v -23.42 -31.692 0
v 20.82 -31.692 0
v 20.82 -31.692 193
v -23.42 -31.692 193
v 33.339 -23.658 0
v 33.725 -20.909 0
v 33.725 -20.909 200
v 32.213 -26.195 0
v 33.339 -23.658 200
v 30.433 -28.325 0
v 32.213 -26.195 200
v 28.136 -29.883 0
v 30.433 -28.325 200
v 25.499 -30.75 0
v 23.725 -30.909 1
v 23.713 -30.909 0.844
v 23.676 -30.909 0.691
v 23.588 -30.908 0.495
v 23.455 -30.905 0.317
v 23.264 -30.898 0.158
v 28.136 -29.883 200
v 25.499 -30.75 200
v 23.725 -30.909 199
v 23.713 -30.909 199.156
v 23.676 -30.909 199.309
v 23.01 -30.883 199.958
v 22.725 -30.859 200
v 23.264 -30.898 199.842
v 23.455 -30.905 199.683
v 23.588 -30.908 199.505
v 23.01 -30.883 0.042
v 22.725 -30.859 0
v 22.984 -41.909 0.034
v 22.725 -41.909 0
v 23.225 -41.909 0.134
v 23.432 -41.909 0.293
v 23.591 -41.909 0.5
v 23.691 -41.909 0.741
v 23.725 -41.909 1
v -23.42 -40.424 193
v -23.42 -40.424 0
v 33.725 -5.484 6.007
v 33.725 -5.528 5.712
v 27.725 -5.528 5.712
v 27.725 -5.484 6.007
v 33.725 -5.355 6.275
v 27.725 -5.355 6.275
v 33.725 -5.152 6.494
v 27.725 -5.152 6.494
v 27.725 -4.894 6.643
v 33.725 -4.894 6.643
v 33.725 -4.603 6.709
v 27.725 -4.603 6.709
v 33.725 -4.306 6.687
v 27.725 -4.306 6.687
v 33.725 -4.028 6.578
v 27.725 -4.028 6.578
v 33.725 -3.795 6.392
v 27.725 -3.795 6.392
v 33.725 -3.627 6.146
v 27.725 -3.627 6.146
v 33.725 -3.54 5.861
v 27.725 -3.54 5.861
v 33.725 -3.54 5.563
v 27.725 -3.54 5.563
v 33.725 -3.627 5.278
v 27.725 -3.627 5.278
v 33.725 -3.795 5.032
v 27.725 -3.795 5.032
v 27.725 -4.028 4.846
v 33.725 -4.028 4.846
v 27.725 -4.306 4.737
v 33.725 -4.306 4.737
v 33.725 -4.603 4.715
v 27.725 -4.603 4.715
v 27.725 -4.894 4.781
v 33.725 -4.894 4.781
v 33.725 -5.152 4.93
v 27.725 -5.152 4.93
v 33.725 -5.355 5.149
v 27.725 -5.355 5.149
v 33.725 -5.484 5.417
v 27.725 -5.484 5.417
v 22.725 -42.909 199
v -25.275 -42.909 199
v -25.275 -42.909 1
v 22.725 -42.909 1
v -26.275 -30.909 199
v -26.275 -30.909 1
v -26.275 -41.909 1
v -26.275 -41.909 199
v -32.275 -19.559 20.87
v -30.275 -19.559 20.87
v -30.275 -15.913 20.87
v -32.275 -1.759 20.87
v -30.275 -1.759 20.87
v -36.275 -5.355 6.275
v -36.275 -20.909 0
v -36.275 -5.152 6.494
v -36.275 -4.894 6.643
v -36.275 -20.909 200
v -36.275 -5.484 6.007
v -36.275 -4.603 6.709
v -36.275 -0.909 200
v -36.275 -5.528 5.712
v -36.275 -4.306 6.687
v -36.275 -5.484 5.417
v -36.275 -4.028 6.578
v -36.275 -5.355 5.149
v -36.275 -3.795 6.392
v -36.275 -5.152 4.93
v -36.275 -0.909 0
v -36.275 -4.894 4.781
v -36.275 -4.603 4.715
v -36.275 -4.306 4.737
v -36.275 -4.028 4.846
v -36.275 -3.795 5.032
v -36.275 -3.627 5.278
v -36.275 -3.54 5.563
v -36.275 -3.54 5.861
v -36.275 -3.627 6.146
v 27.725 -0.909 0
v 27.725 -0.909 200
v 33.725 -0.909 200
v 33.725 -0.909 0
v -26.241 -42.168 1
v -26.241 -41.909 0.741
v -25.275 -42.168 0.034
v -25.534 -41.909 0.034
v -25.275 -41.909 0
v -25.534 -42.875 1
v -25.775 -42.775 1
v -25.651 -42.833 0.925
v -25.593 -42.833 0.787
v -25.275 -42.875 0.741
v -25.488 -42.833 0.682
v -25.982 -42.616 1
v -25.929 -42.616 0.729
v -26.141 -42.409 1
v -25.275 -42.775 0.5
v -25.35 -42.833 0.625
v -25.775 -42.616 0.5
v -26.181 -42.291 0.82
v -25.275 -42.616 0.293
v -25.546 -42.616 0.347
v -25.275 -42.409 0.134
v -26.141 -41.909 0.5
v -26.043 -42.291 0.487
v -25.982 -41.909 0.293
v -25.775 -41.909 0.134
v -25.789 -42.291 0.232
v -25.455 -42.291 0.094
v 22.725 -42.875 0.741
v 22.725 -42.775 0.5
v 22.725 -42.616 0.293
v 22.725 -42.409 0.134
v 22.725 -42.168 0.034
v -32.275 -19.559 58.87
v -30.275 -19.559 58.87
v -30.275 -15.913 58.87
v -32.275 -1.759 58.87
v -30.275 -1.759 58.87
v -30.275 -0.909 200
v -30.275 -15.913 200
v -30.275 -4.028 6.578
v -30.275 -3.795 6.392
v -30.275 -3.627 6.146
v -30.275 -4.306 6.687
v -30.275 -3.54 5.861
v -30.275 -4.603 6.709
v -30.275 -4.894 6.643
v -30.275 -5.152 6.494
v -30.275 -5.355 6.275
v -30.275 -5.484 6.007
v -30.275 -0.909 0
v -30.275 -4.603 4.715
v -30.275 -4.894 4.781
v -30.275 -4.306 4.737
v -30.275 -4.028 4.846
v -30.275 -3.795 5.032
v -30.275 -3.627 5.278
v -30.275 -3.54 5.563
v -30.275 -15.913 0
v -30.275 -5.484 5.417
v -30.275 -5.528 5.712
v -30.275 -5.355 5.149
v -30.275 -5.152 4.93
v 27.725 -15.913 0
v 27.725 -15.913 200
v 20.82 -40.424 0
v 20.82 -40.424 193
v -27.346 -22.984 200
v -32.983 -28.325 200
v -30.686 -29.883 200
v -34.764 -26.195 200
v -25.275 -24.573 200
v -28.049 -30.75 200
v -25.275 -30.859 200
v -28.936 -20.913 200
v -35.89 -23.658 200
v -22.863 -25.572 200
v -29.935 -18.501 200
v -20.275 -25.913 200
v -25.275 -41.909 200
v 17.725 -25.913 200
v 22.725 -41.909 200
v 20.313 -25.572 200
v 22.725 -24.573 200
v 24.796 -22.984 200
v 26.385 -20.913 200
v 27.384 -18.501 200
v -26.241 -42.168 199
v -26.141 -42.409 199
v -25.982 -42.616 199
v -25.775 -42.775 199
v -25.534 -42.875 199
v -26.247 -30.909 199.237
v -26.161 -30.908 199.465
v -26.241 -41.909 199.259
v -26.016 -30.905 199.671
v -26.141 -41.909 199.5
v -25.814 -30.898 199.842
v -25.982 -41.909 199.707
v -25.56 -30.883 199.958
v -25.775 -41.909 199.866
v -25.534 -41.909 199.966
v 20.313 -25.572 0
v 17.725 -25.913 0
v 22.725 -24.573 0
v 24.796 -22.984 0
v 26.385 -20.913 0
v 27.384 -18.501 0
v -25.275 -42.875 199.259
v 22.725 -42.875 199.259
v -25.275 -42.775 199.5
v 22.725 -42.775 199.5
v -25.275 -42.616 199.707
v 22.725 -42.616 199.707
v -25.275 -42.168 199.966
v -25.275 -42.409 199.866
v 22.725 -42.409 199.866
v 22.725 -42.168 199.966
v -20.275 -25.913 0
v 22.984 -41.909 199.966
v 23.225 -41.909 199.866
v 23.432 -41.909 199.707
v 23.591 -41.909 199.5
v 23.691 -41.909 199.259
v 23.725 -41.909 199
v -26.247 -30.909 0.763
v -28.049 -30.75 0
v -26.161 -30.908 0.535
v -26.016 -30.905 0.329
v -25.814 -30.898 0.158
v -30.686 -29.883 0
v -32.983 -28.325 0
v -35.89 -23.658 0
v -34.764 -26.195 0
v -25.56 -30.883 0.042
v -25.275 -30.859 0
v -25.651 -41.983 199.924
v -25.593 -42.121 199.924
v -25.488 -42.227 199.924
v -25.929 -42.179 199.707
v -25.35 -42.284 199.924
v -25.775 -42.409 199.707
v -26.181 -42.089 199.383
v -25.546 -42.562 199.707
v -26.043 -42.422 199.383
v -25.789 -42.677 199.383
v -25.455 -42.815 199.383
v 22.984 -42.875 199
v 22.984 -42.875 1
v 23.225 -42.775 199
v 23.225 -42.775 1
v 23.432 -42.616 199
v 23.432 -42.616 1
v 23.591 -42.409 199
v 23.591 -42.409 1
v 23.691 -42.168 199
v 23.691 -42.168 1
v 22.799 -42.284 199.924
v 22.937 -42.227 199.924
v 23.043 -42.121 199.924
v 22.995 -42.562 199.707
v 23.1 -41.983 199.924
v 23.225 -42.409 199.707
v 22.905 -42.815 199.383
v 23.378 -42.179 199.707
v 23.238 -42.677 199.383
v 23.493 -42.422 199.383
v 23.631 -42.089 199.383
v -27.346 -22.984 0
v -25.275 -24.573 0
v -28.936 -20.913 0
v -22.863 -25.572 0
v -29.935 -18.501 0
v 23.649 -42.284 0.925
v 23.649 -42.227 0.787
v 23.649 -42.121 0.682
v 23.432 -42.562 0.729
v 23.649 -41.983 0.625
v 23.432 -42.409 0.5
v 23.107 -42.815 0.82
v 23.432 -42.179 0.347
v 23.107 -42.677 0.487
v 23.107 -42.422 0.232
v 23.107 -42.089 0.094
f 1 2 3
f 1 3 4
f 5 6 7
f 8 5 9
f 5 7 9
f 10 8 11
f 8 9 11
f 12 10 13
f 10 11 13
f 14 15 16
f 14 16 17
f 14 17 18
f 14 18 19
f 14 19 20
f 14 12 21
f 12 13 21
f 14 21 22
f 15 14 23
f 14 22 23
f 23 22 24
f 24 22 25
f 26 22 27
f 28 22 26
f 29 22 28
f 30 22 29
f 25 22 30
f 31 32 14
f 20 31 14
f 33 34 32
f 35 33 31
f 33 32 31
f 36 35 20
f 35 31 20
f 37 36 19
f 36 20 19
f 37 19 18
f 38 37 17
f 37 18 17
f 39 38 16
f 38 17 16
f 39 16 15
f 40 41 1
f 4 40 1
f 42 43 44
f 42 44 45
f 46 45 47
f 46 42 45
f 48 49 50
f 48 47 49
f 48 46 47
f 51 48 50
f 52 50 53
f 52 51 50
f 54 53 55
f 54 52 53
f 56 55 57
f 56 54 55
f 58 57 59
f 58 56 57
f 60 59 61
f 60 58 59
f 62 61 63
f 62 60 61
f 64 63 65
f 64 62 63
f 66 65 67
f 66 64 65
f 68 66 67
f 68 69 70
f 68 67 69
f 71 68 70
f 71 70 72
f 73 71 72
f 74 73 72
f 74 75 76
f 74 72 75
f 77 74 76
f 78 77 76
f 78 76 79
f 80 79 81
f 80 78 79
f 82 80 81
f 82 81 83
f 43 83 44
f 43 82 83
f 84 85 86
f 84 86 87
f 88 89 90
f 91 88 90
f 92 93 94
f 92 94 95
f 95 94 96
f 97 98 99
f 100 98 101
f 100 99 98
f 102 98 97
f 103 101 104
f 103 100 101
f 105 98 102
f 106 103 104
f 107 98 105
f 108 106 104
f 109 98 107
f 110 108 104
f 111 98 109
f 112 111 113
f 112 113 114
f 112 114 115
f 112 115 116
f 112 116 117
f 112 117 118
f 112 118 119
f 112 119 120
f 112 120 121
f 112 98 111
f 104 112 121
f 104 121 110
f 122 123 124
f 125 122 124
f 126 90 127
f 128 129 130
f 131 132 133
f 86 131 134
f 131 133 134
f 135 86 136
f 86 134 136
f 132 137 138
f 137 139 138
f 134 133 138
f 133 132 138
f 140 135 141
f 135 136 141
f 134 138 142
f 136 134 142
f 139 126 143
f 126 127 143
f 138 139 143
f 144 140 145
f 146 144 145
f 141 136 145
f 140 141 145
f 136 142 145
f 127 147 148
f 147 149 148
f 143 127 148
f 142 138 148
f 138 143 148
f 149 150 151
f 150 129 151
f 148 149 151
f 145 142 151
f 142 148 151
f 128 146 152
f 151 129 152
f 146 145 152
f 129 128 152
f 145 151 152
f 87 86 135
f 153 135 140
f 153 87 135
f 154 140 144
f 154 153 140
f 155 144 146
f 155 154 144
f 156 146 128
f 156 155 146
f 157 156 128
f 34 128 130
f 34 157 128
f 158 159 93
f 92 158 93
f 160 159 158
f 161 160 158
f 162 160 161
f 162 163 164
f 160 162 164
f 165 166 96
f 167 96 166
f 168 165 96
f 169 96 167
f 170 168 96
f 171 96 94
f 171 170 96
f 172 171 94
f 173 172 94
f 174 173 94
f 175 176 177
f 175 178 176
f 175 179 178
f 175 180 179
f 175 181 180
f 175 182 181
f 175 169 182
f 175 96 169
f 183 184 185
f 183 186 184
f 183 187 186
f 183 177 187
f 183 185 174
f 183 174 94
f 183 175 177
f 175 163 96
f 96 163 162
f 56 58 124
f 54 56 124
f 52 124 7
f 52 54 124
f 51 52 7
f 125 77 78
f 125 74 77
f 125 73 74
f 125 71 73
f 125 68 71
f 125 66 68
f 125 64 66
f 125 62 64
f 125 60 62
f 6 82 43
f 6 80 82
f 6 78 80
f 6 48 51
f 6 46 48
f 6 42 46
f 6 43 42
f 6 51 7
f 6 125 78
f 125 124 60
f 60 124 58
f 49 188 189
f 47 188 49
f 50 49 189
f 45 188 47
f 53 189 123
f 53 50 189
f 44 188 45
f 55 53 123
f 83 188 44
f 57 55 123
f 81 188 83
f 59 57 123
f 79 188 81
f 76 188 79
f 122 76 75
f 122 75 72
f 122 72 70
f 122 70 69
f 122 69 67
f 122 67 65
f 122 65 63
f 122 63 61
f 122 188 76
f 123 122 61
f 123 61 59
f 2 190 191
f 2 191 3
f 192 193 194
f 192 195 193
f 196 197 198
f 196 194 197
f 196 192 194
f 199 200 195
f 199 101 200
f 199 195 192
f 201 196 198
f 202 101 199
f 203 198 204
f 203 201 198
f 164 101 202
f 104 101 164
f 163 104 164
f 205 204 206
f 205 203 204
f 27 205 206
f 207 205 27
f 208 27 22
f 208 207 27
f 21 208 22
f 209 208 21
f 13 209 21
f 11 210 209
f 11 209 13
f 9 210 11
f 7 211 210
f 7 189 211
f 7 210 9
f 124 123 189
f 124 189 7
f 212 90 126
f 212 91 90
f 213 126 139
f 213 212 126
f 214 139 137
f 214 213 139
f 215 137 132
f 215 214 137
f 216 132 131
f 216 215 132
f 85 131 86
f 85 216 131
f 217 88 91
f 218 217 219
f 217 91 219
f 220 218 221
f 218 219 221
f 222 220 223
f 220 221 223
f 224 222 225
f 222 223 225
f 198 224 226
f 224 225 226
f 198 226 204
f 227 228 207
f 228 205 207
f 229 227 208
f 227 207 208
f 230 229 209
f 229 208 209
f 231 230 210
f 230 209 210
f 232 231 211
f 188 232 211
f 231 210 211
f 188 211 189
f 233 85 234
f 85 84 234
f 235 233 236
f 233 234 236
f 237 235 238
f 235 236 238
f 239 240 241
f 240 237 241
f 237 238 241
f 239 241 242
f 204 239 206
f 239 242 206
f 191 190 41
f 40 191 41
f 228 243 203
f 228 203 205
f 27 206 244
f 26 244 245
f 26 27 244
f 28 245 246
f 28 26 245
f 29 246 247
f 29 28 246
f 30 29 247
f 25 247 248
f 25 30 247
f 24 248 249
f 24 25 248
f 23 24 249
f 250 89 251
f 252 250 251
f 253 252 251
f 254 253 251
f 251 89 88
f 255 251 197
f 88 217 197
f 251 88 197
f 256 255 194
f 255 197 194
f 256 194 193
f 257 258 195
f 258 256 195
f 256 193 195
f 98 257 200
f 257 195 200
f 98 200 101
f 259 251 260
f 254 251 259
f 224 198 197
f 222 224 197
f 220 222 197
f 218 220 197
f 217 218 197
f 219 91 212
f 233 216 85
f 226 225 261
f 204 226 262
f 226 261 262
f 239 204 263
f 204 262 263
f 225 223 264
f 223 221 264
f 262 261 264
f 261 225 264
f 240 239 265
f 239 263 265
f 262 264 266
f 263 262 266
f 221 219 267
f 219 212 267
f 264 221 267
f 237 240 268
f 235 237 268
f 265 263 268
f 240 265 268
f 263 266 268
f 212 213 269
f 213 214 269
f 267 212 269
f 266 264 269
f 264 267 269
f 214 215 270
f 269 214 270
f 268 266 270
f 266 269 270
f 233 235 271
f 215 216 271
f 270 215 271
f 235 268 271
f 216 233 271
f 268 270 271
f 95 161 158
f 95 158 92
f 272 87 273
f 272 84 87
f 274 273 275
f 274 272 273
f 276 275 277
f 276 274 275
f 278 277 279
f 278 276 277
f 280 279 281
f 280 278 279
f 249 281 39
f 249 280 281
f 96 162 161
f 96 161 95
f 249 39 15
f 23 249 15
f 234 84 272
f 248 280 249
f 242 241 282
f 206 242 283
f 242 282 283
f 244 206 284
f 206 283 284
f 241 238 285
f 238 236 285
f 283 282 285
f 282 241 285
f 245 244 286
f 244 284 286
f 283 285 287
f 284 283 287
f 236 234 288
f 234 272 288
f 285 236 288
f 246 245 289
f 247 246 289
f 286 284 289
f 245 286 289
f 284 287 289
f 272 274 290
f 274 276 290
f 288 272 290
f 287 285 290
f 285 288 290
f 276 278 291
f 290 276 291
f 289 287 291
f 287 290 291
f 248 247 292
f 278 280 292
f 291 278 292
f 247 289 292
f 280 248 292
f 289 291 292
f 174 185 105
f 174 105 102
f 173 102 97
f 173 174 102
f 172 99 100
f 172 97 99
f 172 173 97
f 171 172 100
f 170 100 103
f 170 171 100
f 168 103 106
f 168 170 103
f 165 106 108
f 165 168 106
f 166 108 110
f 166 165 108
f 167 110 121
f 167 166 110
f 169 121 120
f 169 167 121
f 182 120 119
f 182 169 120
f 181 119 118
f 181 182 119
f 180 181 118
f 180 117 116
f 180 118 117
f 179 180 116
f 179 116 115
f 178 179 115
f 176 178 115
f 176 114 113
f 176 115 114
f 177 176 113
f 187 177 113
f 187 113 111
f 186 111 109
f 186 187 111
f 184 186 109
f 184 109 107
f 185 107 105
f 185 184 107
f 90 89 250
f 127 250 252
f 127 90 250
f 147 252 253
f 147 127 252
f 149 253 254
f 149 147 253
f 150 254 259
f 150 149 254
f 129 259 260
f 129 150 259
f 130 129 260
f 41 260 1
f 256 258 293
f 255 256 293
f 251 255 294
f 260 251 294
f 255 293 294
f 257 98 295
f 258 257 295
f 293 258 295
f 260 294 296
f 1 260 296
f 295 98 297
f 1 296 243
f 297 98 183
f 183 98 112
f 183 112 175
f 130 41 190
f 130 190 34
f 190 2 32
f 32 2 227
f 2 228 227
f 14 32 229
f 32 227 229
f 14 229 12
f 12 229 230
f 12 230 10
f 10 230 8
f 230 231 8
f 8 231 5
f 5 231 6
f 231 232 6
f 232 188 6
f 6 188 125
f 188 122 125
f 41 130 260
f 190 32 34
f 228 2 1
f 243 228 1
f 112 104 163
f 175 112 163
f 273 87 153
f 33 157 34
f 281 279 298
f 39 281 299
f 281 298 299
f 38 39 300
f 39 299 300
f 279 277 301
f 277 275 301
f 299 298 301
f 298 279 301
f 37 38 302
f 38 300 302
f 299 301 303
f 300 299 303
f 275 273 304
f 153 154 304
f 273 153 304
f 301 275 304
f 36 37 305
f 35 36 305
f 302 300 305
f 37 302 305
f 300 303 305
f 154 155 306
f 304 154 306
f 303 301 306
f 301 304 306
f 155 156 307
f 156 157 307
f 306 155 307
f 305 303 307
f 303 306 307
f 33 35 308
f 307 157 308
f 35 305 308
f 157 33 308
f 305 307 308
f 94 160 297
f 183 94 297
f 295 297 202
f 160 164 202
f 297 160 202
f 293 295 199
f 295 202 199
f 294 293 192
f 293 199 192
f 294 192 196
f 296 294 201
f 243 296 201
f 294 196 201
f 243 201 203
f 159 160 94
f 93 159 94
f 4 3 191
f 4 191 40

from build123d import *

# Parameters (mm, degrees)
BOSS_EXTRUDE1_DEPTH      = 200
FILLET1_R                = 10
SKETCH12_W               = 38
SKETCH12_H               = 17.8
CUT_EXTRUDE9_DEPTH       = 2
BOSS_EXTRUDE2_DEPTH      = 200
FILLET4_R                = 1
SKETCH17_W               = 44.239510651
SKETCH17_H               = 8.731521098
CUT_EXTRUDE11_DEPTH      = 193
CUT_EXTRUDE12_DEPTH      = 215.329567289
CUT_EXTRUDE12_DEPTH_BACK = 215.329567289
SKETCH20_R               = 1


with BuildPart() as part:
    # Sketch1 → Boss-Extrude1 (new body)
    with BuildSketch(Plane.XY):
        Polygon((-30.275246352, -0.908779536), (-30.275246352, -25.913082449), (27.724753648, -25.913082449), (27.724753648, -0.908779536), (33.724753648, -0.908779536), (33.724753648, -30.908779536), (-36.275246352, -30.908779536), (-36.275246352, -0.908779536), align=None)
    extrude(amount=BOSS_EXTRUDE1_DEPTH)

    # Fillet1
    fillet1_edges = [part.edges().sort_by_distance(p)[0] for p in [
        (-30.275246352, -25.913082449, 100),
        (27.724753648, -25.913082449, 100),
        (33.724753648, -30.908779536, 100),
        (-36.275246352, -30.908779536, 100),
    ]]
    fillet(fillet1_edges, radius=FILLET1_R)

    # Sketch12 → Cut-Extrude9 (cut)
    with BuildSketch(Plane(origin=(-30.275246352, 0, 0), x_dir=(0, 0, -1), z_dir=(1, 0, 0))):
        with Locations((-39.87, -10.658779536)):
            Rectangle(SKETCH12_W, SKETCH12_H)
    extrude(amount=-CUT_EXTRUDE9_DEPTH, mode=Mode.SUBTRACT)

    # Sketch15 → Boss-Extrude2 (add)
    with BuildSketch(Plane.XY):
        Polygon((-26.275246352, -30.908779536), (-26.275246352, -42.908779536), (23.724753648, -42.908779536), (23.724753648, -30.908779536), (20.724753648, -30.908779536), (-23.275246352, -30.908779536), align=None)
    extrude(amount=BOSS_EXTRUDE2_DEPTH)

    # Fillet4
    fillet4_edges = [part.edges().sort_by_distance(p)[0] for p in [
        (-26.275246352, -36.908779536, 0),
        (-26.275246352, -42.908779536, 100),
        (-1.275246352, -42.908779536, 0),
        (23.724753648, -42.908779536, 100),
        (23.724753648, -36.908779536, 0),
        (-26.275246352, -36.908779536, 200),
        (-1.275246352, -42.908779536, 200),
        (23.724753648, -36.908779536, 200),
    ]]
    fillet(fillet4_edges, radius=FILLET4_R)

    # Sketch17 → Cut-Extrude11 (cut)
    with BuildSketch(Plane(origin=(0, 0, 0), x_dir=(-1, 0, 0), z_dir=(0, 0, -1))):
        with Locations((1.300040019, -36.058148136)):
            Rectangle(SKETCH17_W, SKETCH17_H)
    extrude(amount=-CUT_EXTRUDE11_DEPTH, mode=Mode.SUBTRACT)

    # Sketch20 → Cut-Extrude12 (cut, two sides: drawn at the far end of the back side and taken through both)
    with BuildSketch(Plane.ZY.offset(-27.724753648).offset(-CUT_EXTRUDE12_DEPTH_BACK)):
        with Locations(Location((5.712078597, -4.528347047, 0), (0, 0, 270))):
            Circle(SKETCH20_R)
    extrude(amount=CUT_EXTRUDE12_DEPTH + CUT_EXTRUDE12_DEPTH_BACK, mode=Mode.SUBTRACT)


solid = part.part
